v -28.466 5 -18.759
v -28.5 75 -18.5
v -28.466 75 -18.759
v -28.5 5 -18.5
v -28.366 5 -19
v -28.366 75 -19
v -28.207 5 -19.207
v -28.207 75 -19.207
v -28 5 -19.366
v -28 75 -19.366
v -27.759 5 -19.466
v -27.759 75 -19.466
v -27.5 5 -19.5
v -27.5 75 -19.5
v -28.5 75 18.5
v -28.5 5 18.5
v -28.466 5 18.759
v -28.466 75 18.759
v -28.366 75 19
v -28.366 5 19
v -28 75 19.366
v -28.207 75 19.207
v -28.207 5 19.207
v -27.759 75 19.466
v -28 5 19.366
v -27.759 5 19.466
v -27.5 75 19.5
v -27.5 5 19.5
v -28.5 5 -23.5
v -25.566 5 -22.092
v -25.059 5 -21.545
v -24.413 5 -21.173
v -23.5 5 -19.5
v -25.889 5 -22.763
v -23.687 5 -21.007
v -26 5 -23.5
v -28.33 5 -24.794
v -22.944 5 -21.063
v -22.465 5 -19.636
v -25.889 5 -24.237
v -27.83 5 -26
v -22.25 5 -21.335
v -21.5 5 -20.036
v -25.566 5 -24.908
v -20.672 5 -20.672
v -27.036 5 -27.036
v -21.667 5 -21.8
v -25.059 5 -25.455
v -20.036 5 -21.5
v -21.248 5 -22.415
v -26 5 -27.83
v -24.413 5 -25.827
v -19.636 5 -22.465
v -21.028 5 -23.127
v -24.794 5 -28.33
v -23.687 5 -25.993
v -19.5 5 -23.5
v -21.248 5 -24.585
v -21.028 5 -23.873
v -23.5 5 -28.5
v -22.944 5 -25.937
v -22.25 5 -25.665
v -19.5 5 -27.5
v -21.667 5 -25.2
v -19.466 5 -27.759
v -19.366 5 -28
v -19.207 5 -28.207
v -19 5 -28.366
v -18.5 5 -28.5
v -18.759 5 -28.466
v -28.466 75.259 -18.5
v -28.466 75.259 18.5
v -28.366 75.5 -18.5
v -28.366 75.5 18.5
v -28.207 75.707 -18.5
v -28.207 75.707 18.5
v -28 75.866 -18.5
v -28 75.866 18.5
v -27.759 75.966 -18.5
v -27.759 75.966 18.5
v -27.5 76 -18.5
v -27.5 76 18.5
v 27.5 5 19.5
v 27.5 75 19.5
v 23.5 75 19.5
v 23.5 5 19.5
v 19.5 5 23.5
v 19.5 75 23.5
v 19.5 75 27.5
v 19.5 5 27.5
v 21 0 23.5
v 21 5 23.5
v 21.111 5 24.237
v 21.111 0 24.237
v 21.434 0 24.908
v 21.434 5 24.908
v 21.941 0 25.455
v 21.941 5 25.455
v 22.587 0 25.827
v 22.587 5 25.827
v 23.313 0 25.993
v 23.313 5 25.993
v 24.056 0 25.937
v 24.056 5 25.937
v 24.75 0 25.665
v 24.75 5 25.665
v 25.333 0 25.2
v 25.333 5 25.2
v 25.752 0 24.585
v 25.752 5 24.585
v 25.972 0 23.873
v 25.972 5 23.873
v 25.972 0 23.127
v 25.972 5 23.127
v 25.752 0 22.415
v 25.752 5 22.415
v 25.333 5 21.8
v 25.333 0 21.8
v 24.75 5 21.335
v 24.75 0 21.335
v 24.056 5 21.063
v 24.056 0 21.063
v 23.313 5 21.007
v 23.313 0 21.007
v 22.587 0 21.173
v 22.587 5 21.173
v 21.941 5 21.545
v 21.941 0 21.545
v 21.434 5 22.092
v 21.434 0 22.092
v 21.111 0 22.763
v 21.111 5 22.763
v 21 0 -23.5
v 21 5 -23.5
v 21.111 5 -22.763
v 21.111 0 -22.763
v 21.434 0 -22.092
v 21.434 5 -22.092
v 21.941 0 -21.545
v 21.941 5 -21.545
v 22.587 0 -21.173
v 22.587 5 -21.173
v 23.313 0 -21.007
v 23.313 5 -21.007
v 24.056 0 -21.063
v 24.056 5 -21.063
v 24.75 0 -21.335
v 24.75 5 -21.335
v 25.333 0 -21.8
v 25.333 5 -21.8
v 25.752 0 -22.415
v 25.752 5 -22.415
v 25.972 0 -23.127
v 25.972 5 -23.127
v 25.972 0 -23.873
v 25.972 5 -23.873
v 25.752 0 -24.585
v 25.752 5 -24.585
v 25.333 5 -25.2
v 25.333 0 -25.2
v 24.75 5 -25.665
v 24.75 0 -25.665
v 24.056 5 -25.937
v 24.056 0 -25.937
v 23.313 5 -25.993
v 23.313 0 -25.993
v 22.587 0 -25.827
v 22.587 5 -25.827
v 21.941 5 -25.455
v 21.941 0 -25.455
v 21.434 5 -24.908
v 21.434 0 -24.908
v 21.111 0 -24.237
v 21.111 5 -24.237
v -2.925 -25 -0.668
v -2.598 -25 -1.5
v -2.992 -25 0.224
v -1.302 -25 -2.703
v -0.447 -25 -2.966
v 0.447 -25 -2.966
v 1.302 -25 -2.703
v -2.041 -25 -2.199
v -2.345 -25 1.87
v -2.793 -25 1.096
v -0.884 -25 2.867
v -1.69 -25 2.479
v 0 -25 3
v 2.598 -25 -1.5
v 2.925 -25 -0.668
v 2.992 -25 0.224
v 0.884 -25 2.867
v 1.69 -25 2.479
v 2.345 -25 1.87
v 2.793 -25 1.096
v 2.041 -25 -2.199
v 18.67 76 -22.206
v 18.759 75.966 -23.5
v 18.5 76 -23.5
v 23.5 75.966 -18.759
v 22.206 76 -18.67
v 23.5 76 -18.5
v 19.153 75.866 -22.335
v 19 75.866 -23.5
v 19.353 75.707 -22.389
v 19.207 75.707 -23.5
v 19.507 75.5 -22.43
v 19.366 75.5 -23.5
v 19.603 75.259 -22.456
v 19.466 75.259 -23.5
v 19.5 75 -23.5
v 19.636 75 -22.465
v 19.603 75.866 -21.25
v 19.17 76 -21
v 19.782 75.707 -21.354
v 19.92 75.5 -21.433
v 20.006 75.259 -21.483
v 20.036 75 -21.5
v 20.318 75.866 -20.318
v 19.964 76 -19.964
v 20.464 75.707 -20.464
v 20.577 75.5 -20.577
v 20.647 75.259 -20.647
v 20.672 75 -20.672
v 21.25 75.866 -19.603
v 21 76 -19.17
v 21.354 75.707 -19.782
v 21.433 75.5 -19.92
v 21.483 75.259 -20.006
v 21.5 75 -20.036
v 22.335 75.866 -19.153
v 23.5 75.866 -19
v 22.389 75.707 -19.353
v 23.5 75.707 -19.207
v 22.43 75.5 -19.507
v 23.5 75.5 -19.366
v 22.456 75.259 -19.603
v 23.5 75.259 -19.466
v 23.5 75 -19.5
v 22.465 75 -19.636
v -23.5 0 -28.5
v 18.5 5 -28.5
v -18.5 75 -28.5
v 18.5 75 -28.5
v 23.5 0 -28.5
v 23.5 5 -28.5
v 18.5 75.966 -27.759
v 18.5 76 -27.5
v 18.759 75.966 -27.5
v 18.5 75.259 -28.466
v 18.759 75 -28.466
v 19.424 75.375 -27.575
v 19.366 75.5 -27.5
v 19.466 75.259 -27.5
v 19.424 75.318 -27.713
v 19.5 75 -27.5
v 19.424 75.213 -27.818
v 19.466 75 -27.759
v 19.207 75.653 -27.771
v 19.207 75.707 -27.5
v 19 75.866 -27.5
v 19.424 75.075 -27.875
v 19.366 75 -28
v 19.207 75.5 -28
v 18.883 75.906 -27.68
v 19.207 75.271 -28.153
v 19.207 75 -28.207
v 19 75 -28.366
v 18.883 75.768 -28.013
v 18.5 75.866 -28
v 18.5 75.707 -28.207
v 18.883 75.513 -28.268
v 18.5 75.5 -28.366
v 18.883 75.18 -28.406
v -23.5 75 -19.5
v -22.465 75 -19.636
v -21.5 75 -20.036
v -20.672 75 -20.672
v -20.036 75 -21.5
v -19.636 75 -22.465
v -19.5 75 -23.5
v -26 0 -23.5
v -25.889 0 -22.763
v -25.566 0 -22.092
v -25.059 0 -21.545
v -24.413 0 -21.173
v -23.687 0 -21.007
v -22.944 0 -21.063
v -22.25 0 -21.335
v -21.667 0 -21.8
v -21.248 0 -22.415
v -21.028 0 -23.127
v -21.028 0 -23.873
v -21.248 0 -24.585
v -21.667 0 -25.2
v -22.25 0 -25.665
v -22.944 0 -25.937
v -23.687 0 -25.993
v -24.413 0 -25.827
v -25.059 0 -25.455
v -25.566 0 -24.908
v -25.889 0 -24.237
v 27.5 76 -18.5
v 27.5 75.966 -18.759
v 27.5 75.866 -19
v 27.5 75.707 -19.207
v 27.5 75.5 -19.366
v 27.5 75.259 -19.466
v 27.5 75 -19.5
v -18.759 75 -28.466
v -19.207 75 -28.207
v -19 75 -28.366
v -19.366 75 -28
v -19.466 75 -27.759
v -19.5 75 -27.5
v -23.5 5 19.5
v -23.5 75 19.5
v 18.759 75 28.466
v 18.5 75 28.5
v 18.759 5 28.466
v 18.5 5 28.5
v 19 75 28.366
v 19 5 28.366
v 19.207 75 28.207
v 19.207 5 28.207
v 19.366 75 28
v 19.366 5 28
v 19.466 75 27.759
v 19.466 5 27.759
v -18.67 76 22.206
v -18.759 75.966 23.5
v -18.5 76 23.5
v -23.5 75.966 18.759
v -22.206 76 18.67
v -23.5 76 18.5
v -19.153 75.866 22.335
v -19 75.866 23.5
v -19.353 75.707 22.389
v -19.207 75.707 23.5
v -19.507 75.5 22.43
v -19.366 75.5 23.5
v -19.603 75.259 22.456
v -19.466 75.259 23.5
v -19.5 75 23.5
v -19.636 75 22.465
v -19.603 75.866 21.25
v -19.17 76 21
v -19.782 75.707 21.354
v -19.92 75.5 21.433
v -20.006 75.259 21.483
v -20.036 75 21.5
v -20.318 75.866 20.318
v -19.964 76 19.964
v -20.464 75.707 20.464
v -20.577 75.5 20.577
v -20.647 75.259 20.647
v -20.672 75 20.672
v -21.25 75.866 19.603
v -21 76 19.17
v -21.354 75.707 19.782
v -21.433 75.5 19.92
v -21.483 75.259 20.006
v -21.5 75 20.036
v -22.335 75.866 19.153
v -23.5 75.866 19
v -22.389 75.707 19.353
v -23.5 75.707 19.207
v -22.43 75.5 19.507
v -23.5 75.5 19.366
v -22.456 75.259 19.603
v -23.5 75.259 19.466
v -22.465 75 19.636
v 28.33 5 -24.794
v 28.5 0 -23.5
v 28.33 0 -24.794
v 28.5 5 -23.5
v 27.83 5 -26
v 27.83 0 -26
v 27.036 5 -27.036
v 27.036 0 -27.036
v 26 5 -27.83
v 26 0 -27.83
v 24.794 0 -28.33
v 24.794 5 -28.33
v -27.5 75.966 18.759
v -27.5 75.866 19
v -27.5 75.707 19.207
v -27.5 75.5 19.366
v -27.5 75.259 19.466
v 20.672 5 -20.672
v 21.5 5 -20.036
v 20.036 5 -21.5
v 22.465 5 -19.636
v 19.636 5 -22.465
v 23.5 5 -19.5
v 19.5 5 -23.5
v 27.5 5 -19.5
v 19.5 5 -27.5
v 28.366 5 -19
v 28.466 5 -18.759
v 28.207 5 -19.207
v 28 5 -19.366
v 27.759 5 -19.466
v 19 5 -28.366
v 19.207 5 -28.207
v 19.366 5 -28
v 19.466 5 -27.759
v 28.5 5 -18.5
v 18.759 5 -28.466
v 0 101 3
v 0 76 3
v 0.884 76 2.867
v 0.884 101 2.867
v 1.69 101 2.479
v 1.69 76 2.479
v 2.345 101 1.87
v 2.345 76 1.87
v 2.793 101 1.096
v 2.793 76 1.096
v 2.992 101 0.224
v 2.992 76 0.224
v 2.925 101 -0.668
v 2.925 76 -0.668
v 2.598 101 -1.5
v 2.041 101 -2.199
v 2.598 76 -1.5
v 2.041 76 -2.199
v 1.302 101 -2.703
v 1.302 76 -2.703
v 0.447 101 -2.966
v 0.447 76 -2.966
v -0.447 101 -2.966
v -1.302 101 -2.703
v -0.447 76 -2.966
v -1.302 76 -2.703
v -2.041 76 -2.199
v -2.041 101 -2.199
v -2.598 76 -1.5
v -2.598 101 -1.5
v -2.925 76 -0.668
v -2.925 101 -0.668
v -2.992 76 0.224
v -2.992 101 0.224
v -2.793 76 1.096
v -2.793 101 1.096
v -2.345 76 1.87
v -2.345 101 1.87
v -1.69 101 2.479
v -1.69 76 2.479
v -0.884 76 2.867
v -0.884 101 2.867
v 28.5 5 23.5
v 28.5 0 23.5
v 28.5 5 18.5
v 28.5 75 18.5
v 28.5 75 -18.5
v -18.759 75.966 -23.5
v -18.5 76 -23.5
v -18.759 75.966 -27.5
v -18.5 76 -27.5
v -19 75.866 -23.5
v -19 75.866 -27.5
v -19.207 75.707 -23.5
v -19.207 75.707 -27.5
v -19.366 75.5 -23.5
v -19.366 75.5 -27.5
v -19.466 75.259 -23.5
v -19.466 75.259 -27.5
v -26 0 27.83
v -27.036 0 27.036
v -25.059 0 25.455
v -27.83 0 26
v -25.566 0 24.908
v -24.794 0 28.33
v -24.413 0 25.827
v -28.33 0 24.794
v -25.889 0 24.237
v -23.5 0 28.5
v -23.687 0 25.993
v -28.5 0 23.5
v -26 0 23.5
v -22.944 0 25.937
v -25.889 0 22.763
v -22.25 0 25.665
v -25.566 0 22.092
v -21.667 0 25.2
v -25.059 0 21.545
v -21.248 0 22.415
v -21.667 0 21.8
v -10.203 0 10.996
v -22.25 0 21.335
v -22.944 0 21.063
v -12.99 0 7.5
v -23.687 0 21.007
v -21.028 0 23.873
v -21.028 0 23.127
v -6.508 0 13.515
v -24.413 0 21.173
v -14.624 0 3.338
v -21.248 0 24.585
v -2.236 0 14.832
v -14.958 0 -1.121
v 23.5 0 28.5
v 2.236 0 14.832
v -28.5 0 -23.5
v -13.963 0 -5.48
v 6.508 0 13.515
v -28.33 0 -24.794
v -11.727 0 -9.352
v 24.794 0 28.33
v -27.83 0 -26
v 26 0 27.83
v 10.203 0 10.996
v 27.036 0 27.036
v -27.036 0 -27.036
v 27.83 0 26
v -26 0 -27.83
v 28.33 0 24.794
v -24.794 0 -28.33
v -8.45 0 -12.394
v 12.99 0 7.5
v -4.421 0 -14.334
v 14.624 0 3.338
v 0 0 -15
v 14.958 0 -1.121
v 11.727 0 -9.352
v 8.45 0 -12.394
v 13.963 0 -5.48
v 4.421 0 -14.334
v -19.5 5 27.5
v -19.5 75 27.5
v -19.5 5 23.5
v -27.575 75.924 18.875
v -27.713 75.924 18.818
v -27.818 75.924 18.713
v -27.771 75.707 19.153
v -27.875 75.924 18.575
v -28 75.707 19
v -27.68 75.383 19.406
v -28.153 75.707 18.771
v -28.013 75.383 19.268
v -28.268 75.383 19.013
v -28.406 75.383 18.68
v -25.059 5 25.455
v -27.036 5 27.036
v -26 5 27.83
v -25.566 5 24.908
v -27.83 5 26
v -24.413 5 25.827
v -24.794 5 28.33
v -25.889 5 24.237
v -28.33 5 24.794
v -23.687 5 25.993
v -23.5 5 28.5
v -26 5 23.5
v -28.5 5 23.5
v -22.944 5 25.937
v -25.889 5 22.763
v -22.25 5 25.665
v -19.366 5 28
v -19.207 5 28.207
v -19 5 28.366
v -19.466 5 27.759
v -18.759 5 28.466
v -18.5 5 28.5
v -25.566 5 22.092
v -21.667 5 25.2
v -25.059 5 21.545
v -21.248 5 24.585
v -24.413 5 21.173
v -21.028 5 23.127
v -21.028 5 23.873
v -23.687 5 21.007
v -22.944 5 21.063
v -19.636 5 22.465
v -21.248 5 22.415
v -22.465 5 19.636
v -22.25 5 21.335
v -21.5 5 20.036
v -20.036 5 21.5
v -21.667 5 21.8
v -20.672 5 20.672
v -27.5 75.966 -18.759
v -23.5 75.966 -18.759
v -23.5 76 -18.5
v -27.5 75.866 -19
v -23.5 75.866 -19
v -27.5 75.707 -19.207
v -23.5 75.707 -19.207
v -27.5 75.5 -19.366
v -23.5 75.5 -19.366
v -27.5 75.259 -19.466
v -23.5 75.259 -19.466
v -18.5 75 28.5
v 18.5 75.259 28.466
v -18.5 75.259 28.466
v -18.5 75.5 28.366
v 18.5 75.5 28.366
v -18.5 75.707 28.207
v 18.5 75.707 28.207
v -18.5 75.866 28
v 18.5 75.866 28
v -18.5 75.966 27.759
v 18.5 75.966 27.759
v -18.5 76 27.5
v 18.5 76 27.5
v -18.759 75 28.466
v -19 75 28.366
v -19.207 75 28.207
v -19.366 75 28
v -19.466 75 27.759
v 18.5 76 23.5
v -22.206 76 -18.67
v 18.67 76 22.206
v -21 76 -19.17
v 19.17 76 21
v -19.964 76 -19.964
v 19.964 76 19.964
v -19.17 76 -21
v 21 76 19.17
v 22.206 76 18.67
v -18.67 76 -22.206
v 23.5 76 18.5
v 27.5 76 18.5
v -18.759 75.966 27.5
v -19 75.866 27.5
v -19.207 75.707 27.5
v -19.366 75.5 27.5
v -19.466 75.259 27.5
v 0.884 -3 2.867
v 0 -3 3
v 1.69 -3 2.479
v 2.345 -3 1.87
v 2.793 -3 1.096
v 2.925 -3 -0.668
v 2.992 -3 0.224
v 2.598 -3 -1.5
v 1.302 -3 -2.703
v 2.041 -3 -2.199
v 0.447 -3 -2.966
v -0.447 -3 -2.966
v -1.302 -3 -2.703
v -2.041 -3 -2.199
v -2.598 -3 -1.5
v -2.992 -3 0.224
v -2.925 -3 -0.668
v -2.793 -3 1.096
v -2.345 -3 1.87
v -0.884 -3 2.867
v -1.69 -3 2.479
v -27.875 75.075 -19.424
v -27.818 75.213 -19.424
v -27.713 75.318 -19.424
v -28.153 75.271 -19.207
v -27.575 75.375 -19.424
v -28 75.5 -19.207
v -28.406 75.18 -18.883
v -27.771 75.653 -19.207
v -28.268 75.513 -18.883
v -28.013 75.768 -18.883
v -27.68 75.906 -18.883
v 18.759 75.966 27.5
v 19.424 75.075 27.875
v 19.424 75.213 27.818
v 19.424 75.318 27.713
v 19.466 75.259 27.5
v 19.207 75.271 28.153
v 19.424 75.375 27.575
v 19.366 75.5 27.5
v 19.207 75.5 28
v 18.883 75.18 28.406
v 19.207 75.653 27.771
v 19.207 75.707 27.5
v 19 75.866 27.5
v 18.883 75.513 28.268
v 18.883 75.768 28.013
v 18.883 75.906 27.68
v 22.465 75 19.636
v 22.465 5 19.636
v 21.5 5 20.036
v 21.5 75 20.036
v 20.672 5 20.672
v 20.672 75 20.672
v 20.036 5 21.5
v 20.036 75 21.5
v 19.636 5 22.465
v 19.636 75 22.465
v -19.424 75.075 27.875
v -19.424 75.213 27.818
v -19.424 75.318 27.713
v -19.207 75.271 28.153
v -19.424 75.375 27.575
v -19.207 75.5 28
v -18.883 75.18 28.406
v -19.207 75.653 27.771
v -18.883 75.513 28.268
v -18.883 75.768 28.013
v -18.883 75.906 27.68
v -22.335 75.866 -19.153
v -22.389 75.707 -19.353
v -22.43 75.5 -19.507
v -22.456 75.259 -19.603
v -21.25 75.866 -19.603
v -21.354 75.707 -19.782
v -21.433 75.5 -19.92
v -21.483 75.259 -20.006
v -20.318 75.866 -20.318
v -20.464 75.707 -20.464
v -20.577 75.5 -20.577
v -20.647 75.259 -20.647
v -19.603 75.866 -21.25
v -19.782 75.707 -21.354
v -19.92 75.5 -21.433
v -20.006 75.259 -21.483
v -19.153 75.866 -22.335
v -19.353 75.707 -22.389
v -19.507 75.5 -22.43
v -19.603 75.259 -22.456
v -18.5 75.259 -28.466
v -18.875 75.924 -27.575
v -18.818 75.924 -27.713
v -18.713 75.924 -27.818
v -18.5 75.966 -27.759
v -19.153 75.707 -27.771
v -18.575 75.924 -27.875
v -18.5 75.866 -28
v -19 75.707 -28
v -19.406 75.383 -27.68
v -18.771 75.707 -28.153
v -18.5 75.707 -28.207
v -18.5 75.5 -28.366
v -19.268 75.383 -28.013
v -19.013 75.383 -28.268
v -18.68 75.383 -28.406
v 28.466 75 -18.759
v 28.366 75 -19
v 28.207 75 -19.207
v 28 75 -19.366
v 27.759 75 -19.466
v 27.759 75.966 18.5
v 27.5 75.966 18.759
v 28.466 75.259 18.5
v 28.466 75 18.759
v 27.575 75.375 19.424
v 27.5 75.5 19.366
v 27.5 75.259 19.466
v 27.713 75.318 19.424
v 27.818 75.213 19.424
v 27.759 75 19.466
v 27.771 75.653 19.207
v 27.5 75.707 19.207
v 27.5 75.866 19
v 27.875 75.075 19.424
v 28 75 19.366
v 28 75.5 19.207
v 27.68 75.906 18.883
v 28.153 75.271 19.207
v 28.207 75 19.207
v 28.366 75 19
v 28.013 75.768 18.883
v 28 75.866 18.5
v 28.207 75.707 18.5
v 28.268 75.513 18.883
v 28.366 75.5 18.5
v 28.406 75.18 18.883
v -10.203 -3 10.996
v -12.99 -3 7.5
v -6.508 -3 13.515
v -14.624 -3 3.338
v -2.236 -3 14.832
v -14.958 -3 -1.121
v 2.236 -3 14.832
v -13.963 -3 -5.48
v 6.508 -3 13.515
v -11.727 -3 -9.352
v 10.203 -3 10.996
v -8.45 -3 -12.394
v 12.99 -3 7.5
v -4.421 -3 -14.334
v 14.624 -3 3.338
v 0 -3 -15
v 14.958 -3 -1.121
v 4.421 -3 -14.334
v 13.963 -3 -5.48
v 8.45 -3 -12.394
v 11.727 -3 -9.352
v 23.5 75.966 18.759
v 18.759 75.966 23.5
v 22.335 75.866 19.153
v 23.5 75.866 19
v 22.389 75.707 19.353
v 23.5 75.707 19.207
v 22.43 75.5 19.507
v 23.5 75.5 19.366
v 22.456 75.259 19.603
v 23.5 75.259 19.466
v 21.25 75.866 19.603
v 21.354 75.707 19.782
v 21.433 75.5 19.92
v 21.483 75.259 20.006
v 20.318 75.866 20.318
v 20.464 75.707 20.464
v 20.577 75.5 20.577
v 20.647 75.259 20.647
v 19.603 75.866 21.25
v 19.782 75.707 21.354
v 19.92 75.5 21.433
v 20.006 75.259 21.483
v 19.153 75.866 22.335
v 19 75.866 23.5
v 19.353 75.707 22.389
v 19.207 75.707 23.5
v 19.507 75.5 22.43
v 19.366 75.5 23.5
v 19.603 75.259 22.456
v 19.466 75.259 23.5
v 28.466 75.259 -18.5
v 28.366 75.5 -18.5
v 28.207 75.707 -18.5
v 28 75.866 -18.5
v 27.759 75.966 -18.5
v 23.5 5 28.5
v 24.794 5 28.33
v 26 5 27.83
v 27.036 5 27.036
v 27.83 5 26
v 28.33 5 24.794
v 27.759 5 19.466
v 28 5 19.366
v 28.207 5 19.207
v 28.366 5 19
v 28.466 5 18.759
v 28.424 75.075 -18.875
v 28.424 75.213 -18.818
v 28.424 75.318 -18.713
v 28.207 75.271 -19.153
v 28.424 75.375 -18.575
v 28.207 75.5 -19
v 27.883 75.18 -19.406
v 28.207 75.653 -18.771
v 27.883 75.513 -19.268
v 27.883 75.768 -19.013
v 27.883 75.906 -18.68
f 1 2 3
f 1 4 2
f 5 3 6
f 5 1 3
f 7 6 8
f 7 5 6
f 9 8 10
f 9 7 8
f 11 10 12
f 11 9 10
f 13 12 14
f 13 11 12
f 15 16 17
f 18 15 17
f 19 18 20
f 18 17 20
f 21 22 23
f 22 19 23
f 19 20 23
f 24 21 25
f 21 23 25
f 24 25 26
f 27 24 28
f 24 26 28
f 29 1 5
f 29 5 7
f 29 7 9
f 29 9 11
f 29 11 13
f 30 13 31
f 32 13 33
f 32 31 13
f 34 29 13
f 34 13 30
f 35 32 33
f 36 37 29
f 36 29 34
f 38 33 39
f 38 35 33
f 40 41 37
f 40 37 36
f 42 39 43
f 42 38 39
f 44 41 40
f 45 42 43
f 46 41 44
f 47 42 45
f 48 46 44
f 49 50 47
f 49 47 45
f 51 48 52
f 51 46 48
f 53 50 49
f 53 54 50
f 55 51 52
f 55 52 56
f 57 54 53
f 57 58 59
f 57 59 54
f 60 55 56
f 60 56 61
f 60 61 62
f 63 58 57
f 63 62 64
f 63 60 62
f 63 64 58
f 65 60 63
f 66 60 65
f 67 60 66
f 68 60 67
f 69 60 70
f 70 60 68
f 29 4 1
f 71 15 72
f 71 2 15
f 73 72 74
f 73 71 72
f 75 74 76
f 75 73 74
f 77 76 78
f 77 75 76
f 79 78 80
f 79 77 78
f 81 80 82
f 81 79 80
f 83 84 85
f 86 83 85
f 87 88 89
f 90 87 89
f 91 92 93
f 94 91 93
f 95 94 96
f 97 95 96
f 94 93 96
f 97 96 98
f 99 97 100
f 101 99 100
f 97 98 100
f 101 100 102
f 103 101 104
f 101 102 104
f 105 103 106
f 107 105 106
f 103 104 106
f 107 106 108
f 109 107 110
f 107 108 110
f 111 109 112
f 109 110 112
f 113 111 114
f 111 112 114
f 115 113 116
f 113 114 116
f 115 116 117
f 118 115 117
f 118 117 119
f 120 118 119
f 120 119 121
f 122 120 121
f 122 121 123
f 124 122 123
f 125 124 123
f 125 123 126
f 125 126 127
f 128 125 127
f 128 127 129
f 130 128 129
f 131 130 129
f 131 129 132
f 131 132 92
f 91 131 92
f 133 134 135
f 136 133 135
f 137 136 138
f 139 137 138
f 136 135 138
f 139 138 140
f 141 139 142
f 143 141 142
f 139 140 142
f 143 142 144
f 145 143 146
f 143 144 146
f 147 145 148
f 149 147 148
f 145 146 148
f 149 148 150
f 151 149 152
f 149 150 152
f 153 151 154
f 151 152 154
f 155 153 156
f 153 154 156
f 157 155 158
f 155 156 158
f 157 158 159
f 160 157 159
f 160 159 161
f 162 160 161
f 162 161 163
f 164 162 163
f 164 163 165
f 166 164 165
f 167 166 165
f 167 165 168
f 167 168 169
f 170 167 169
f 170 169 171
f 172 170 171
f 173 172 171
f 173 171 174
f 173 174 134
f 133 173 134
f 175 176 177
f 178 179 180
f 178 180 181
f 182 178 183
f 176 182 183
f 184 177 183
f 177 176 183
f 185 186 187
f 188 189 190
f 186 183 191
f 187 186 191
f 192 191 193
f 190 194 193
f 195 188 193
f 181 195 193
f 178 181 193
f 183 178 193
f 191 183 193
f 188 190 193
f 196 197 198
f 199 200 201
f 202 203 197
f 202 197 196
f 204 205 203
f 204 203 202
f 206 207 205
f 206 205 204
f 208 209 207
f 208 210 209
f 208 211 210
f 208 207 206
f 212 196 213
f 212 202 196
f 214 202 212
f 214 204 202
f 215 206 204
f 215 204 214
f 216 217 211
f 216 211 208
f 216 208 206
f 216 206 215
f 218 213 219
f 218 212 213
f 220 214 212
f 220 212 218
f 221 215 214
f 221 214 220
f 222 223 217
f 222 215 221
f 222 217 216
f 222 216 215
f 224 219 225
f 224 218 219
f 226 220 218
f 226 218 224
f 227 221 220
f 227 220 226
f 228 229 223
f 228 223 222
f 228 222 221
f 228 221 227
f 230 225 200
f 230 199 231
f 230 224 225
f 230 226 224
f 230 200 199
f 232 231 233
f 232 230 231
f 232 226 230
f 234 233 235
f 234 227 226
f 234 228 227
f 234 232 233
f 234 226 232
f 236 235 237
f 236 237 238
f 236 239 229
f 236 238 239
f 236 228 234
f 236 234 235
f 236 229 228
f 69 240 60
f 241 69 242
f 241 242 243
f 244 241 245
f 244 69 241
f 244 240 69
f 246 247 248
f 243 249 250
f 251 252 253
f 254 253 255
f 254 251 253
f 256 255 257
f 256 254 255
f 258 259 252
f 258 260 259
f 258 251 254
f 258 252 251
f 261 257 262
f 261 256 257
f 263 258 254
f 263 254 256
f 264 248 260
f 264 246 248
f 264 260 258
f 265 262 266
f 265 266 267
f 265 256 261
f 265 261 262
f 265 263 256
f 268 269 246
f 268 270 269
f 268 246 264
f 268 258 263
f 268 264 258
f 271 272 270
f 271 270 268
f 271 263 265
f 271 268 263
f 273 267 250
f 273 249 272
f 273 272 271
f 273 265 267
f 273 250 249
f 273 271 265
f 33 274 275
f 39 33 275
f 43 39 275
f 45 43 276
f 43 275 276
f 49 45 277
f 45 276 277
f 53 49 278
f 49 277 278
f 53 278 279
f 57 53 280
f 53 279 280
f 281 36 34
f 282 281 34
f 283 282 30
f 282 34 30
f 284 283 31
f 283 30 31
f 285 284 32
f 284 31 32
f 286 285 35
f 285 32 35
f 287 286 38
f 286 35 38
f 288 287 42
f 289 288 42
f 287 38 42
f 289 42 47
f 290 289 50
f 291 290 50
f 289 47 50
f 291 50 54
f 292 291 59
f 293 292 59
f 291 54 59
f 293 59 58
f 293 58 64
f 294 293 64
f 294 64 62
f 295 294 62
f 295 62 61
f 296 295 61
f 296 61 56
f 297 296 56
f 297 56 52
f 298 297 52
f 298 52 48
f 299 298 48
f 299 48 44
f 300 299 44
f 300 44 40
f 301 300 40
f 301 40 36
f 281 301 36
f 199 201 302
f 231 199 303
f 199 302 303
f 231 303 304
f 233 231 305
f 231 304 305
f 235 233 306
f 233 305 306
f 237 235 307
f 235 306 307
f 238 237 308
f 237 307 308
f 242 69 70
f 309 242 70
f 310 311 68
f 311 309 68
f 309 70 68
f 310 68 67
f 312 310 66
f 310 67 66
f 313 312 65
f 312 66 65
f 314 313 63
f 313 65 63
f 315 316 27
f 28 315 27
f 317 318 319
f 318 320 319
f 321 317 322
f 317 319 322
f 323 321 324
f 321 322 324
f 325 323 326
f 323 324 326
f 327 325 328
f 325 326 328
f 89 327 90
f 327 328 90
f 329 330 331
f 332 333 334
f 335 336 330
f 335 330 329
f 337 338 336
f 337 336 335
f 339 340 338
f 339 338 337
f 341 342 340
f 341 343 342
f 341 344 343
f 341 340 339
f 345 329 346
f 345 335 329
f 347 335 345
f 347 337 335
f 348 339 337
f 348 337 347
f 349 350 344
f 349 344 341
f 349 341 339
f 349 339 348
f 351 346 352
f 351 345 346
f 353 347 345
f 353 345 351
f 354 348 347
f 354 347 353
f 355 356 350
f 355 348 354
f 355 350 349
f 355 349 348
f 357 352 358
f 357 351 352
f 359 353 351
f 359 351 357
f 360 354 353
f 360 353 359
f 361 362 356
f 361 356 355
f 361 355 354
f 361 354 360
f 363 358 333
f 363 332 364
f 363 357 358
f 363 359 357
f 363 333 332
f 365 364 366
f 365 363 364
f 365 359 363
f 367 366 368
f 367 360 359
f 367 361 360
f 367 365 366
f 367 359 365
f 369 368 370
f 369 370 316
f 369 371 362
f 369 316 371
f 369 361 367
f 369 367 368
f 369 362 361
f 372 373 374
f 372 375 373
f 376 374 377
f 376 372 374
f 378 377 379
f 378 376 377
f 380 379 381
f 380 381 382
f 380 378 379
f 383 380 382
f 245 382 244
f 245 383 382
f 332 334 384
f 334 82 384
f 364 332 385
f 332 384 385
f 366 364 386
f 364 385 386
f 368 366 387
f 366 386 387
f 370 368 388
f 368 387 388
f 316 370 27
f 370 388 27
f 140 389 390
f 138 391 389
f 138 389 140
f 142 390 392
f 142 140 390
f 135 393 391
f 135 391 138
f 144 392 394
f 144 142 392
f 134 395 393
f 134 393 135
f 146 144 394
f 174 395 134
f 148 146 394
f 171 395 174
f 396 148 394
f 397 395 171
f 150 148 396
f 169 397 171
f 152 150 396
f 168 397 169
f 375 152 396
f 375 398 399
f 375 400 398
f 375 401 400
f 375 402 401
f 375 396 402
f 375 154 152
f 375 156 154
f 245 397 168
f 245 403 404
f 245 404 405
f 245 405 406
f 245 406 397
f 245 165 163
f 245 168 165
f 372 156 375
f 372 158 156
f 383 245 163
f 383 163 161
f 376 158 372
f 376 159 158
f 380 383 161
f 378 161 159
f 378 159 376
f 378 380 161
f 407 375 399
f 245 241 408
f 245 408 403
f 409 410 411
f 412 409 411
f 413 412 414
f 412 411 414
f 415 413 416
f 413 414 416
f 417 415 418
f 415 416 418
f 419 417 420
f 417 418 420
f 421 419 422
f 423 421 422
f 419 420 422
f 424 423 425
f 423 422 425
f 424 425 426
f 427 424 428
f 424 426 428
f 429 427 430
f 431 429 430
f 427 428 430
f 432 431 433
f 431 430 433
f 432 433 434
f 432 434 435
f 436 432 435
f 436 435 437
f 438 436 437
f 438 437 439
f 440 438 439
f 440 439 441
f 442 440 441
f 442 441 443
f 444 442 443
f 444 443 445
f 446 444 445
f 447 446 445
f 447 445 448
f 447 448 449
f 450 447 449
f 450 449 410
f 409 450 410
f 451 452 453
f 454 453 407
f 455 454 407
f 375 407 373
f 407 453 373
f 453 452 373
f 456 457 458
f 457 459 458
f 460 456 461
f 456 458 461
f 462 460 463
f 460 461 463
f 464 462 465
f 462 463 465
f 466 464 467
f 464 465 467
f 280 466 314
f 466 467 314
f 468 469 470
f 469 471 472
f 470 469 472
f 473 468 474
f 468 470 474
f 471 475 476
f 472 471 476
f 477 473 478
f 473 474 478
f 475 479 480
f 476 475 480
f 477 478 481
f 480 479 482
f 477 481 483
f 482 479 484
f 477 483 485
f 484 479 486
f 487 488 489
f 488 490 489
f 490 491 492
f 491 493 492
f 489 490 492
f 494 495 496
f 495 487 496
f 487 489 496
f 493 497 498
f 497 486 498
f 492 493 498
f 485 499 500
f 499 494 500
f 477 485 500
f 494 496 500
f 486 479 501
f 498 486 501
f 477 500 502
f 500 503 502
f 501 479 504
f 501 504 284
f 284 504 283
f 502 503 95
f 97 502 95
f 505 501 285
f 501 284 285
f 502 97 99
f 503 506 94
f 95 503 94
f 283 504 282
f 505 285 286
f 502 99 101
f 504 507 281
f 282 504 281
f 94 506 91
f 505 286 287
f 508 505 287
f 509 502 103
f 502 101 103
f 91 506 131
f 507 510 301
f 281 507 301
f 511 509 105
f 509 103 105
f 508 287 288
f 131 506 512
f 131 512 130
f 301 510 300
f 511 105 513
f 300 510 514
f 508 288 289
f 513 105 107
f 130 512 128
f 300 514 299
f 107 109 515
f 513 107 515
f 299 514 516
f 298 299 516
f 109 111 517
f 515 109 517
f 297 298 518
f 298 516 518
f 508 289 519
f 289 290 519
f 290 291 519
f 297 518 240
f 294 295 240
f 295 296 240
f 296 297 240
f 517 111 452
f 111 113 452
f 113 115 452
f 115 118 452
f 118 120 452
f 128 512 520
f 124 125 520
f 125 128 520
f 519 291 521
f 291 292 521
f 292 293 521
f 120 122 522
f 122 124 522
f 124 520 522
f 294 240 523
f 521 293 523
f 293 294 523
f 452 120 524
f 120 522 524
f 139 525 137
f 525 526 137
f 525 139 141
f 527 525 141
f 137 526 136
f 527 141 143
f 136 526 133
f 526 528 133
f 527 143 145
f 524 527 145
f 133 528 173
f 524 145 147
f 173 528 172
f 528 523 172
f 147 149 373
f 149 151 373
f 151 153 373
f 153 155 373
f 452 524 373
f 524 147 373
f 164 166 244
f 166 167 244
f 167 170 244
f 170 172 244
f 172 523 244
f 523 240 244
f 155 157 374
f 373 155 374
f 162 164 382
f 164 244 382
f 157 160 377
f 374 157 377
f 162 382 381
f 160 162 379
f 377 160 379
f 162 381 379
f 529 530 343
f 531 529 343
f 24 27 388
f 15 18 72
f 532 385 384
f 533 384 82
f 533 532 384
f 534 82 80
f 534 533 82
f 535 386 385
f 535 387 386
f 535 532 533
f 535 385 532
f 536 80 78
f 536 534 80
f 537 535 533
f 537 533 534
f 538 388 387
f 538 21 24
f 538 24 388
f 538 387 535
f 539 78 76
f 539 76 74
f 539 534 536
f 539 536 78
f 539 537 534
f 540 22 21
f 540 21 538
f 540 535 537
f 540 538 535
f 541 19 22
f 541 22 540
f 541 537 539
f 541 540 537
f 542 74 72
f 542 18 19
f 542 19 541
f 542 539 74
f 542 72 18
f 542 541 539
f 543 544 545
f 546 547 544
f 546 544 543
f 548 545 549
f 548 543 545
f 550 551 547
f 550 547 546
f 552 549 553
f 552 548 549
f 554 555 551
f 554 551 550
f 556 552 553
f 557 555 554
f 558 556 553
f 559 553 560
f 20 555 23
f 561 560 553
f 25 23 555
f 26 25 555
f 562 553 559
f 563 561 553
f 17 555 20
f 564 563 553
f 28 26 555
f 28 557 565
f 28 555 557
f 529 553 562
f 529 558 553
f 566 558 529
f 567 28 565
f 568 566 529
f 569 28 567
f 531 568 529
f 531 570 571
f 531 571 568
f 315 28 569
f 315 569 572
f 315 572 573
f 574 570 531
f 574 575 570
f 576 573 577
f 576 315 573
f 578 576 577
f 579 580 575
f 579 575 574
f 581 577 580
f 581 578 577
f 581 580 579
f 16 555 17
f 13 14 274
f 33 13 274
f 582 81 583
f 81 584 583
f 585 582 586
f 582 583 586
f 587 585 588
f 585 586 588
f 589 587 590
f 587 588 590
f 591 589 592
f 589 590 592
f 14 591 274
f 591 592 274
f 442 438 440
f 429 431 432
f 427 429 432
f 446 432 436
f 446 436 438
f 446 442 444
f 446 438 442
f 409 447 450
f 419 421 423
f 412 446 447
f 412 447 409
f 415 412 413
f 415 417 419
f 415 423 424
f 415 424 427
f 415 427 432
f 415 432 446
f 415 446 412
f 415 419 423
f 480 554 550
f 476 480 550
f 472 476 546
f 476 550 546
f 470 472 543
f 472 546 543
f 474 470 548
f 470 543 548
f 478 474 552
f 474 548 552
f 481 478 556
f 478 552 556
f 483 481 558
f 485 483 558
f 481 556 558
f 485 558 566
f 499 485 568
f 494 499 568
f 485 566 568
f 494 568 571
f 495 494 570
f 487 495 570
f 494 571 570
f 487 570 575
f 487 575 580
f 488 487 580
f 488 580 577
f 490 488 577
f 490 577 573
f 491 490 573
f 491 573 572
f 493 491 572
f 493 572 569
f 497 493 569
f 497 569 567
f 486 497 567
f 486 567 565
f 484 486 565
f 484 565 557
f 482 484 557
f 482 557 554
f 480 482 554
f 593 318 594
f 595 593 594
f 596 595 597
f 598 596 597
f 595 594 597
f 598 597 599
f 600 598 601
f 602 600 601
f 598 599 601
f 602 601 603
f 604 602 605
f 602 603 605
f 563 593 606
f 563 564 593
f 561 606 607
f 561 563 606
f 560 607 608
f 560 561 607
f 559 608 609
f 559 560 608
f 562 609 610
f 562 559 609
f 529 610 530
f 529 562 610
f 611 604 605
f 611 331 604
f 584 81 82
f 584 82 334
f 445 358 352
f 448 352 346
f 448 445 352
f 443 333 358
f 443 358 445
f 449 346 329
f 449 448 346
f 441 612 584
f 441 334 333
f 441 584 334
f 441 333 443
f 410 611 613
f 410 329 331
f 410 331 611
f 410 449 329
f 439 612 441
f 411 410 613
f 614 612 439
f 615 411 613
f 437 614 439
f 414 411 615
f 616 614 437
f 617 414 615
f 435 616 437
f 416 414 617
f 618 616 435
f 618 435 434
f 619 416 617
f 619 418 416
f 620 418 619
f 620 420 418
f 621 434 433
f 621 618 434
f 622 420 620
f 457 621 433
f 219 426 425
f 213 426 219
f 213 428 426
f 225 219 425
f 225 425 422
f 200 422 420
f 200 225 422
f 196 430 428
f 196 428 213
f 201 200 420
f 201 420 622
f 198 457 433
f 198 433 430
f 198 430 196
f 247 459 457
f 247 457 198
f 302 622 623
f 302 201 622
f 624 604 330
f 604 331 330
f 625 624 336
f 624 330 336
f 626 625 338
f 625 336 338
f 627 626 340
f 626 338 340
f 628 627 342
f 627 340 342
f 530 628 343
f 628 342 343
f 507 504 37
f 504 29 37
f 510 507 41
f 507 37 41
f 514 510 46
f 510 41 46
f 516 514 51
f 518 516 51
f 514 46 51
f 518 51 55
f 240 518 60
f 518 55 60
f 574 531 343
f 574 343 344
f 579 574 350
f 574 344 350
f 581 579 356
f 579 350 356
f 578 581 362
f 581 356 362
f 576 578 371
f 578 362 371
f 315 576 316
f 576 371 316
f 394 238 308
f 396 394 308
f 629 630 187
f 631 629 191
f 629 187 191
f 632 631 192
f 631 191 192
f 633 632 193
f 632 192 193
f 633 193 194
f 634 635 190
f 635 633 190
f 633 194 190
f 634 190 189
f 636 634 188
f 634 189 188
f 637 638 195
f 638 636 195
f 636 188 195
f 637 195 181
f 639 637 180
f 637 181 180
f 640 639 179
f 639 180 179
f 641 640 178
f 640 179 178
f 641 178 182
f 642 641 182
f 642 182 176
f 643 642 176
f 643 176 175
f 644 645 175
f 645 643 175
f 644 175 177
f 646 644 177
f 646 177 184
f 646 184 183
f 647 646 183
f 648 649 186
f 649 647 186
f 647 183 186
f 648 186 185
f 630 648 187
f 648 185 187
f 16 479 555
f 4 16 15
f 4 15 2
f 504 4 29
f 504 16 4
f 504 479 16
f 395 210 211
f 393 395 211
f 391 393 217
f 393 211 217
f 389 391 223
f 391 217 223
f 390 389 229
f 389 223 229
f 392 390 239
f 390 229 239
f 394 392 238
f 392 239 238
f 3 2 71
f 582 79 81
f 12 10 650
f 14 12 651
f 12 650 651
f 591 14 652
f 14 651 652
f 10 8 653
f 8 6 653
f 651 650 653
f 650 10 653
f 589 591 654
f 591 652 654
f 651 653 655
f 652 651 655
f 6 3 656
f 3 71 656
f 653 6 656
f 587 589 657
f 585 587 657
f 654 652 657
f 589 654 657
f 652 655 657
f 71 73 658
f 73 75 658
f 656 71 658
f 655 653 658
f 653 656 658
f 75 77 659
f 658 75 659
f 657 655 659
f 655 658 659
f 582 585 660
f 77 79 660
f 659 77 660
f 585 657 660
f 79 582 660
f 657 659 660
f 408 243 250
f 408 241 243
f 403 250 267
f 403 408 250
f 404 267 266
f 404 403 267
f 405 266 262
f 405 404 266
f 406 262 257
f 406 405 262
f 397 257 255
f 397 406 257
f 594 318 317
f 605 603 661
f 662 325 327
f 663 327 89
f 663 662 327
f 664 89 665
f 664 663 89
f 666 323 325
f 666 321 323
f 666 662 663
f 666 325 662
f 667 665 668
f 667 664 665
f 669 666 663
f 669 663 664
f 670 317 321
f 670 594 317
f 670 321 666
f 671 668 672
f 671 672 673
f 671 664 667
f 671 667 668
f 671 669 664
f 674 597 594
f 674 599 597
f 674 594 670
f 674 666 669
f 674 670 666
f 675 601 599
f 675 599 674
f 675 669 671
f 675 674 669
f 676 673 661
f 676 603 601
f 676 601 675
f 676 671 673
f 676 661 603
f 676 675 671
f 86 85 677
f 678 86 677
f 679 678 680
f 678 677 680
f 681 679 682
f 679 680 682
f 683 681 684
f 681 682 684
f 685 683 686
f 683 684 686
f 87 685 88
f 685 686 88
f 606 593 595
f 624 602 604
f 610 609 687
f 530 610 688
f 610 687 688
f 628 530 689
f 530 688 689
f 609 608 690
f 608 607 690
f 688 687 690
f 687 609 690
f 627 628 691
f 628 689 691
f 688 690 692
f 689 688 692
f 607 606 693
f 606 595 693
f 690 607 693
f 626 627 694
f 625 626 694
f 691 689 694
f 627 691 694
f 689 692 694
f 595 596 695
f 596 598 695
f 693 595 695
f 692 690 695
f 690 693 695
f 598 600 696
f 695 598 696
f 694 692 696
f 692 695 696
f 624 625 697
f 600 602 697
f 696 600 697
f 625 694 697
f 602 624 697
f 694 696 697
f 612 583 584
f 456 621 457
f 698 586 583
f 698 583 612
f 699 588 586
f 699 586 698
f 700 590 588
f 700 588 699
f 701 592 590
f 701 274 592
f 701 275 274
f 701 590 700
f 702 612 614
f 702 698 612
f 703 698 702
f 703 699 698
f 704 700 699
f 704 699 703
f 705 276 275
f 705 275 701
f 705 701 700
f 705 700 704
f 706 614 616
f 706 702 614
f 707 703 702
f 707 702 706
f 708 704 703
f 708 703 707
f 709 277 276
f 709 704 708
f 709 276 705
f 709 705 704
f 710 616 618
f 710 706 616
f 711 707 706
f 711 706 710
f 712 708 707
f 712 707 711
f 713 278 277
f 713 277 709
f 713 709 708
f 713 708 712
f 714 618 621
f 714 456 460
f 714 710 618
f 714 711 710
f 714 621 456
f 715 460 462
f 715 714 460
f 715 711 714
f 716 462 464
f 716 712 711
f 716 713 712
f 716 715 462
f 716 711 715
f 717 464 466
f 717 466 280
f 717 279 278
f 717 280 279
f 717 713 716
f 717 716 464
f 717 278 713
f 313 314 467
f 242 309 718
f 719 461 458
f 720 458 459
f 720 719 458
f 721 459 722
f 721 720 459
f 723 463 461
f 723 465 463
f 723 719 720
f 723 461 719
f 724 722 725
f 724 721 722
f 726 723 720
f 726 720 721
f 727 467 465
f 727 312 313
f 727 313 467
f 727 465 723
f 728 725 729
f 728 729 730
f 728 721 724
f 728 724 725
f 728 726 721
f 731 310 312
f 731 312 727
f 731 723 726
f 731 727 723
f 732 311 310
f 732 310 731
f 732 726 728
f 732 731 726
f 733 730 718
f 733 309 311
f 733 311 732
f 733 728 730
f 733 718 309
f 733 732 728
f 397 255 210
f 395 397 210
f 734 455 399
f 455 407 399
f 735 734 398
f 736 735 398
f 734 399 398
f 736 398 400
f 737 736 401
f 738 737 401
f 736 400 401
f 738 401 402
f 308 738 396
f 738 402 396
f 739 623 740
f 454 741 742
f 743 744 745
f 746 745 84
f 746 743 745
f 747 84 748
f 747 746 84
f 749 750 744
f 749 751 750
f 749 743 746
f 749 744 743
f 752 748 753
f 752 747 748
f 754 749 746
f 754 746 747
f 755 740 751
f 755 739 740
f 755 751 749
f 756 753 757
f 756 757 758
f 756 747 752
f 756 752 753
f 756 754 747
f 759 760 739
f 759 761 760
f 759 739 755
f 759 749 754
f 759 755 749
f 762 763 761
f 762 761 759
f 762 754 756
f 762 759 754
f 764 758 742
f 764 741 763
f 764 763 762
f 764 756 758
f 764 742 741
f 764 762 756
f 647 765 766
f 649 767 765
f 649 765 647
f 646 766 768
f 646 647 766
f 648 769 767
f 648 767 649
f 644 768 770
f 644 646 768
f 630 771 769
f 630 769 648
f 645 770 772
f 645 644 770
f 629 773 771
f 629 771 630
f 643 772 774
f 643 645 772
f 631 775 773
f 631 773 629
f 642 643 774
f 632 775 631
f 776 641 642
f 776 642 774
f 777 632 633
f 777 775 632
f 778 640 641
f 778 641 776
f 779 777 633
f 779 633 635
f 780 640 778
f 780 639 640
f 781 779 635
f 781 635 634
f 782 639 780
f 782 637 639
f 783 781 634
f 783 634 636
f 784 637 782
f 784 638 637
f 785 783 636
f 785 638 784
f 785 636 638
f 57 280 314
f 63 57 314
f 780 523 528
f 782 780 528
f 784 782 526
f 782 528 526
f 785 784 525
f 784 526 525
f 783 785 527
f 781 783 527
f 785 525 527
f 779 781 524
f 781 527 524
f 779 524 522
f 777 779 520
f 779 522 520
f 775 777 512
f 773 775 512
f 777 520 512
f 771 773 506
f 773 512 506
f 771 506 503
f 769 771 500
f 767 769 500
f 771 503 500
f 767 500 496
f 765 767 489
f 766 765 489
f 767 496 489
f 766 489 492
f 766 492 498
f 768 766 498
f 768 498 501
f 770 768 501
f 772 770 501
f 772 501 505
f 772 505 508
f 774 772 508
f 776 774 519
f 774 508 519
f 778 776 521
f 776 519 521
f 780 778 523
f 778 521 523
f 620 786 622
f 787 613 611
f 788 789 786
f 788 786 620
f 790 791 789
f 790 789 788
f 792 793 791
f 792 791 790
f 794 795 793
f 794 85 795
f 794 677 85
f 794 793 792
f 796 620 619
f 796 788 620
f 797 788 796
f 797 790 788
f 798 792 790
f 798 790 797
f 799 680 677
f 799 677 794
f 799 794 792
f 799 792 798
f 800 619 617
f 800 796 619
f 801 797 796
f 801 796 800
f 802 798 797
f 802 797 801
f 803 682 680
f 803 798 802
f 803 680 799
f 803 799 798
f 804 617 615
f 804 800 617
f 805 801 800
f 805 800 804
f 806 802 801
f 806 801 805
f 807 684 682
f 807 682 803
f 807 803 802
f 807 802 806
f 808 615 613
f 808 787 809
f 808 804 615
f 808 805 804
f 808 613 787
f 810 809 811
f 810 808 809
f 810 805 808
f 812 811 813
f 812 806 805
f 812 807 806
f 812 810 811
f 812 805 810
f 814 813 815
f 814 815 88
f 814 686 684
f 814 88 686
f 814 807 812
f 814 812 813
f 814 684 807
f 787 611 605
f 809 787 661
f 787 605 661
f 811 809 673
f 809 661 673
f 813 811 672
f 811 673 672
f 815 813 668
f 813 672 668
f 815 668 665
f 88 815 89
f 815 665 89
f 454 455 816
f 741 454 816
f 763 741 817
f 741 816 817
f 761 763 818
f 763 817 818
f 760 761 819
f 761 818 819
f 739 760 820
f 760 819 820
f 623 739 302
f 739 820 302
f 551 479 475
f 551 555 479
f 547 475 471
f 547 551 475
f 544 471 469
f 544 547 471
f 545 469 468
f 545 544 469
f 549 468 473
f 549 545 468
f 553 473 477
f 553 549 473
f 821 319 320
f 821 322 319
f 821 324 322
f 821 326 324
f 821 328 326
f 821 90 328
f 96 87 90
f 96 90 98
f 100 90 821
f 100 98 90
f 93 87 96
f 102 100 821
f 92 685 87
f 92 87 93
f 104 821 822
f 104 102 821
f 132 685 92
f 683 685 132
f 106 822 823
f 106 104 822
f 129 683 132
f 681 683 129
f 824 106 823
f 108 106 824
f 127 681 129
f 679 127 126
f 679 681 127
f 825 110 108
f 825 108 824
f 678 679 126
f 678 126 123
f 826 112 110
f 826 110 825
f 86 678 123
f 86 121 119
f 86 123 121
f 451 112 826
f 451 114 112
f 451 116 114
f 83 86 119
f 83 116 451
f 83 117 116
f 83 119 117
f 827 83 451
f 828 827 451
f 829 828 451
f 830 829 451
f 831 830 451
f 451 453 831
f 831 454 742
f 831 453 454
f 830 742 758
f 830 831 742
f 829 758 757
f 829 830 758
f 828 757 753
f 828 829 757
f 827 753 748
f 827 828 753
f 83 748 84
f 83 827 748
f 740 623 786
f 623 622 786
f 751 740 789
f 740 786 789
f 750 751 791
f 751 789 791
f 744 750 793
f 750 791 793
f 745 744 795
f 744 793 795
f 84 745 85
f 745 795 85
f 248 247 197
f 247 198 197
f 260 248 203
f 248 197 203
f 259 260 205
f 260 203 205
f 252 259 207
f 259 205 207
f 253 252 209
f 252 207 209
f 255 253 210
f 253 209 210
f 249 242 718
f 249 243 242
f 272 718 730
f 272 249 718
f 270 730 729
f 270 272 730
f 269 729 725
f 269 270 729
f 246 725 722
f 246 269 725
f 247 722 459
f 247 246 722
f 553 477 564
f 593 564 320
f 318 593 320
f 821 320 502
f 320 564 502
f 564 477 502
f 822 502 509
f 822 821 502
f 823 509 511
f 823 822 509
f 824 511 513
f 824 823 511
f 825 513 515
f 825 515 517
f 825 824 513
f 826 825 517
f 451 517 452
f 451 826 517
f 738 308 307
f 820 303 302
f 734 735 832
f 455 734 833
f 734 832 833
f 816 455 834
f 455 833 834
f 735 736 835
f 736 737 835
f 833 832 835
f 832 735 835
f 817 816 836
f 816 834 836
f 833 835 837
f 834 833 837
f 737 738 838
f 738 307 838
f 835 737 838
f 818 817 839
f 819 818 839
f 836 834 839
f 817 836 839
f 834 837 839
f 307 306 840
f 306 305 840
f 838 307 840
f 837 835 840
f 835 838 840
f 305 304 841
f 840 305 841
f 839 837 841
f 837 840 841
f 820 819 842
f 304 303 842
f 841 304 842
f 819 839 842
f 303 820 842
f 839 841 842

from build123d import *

# Parameters (mm, degrees)
SKETCH1_W                = 57
SKETCH1_H                = 57
EXTRUDE1_DEPTH           = 76
F_5_0_5_DIAMETER_HOLE1_D = 5
SKETCH6_R                = 4
SKETCH6_R_2              = 2.5
EXTRUDE4_DEPTH           = 71
FILLET1_R                = 5
EXTRUDE5_DEPTH           = 25
EXTRUDE5_DEPTH_BACK      = 101
SKETCH7_R                = 3
SKETCH8_R                = 15
EXTRUDE6_DEPTH           = 3
FILLET2_R                = 1


with BuildPart() as part:
    # Sketch1 → Extrude1 (new body)
    with BuildSketch(Plane(origin=(0, 0, 0), x_dir=(1, 0, 0), z_dir=(0, 1, 0))):
        Rectangle(SKETCH1_W, SKETCH1_H)
    extrude(amount=EXTRUDE1_DEPTH)

    # Ø5.0 (5) Diameter Hole1 (through all)
    with Locations(Plane.XZ):
        with Locations((-23.5, 23.5), (23.5, 23.5), (23.5, -23.5), (-23.5, -23.5)):
            Hole(F_5_0_5_DIAMETER_HOLE1_D / 2)

    # Sketch6 → Extrude4 (cut)
    # profile 1 of 12: a face of its own
    with BuildSketch(Plane(origin=(0, 76, 0), x_dir=(1, 0, 0), z_dir=(0, 1, 0))):
        Polygon((-28.5, 28.5), (-19.5, 28.5), (-19.5, 32.511741208), (-33.908905561, 32.511741208), (-33.908905561, 19.5), (-28.5, 19.5), align=None)
    # profile 2 of 12: a face of its own
    with BuildSketch(Plane(origin=(0, 76, 0), x_dir=(1, 0, 0), z_dir=(0, 1, 0))):
        with BuildLine():
            ThreePointArc((-23.5, 19.5), (-26.328427125, 26.328427125), (-19.5, 23.5))
            Line((-19.5, 23.5), (-19.5, 28.5))
            Line((-19.5, 28.5), (-28.5, 28.5))
            Line((-28.5, 28.5), (-28.5, 19.5))
            Line((-28.5, 19.5), (-23.5, 19.5))
        make_face()
    # profile 3 of 12: a face of its own
    with BuildSketch(Plane(origin=(0, 76, 0), x_dir=(1, 0, 0), z_dir=(0, 1, 0))):
        with Locations((-23.5, 23.5)):
            Circle(SKETCH6_R)
        with Locations(Location((-23.5, 23.5, 0), (0, 0, 90))):
            Circle(SKETCH6_R_2, mode=Mode.SUBTRACT)
    # profile 4 of 12: a face of its own
    with BuildSketch(Plane(origin=(0, 76, 0), x_dir=(1, 0, 0), z_dir=(0, 1, 0))):
        Polygon((19.5, 36.471560472), (19.5, 28.5), (28.5, 28.5), (28.5, 19.5), (41.168352552, 19.5), (41.168352552, 36.471560472), align=None)
    # profile 5 of 12: a face of its own
    with BuildSketch(Plane(origin=(0, 76, 0), x_dir=(1, 0, 0), z_dir=(0, 1, 0))):
        with BuildLine():
            Line((28.5, 28.5), (19.5, 28.5))
            Line((19.5, 28.5), (19.5, 23.5))
            ThreePointArc((19.5, 23.5), (23.5, 27.5), (27.5, 23.5))
            ThreePointArc((27.5, 23.5), (26.328427125, 20.671572875), (23.5, 19.5))
            Line((23.5, 19.5), (28.5, 19.5))
            Line((28.5, 19.5), (28.5, 28.5))
        make_face()
    # profile 6 of 12: a face of its own
    with BuildSketch(Plane(origin=(0, 76, 0), x_dir=(1, 0, 0), z_dir=(0, 1, 0))):
        with Locations((23.5, 23.5)):
            Circle(SKETCH6_R)
        with Locations(Location((23.5, 23.5, 0), (0, 0, 90))):
            Circle(SKETCH6_R_2, mode=Mode.SUBTRACT)
    # profile 7 of 12: a face of its own
    with BuildSketch(Plane(origin=(0, 76, 0), x_dir=(1, 0, 0), z_dir=(0, 1, 0))):
        with Locations((23.5, -23.5)):
            Circle(SKETCH6_R)
        with Locations(Location((23.5, -23.5, 0), (0, 0, 90))):
            Circle(SKETCH6_R_2, mode=Mode.SUBTRACT)
    # profile 8 of 12: a face of its own
    with BuildSketch(Plane(origin=(0, 76, 0), x_dir=(1, 0, 0), z_dir=(0, 1, 0))):
        with BuildLine():
            Line((28.5, -28.5), (28.5, -19.5))
            Line((28.5, -19.5), (23.5, -19.5))
            ThreePointArc((23.5, -19.5), (26.328427125, -20.671572875), (27.5, -23.5))
            ThreePointArc((27.5, -23.5), (23.5, -27.5), (19.5, -23.5))
            Line((19.5, -23.5), (19.5, -28.5))
            Line((19.5, -28.5), (28.5, -28.5))
        make_face()
    # profile 9 of 12: a face of its own
    with BuildSketch(Plane(origin=(0, 76, 0), x_dir=(1, 0, 0), z_dir=(0, 1, 0))):
        Polygon((44.252209519, -19.5), (28.5, -19.5), (28.5, -28.5), (19.5, -28.5), (19.5, -40.050429997), (44.252209519, -40.050429997), align=None)
    # profile 10 of 12: a face of its own
    with BuildSketch(Plane(origin=(0, 76, 0), x_dir=(1, 0, 0), z_dir=(0, 1, 0))):
        Polygon((-28.5, -28.5), (-28.5, -19.5), (-37.670786859, -19.5), (-37.670786859, -37.828231874), (-19.5, -37.828231874), (-19.5, -28.5), align=None)
    # profile 11 of 12: a face of its own
    with BuildSketch(Plane(origin=(0, 76, 0), x_dir=(1, 0, 0), z_dir=(0, 1, 0))):
        with BuildLine():
            Line((-23.5, -19.5), (-28.5, -19.5))
            Line((-28.5, -19.5), (-28.5, -28.5))
            Line((-28.5, -28.5), (-19.5, -28.5))
            Line((-19.5, -28.5), (-19.5, -23.5))
            ThreePointArc((-19.5, -23.5), (-26.328427125, -26.328427125), (-23.5, -19.5))
        make_face()
    # profile 12 of 12: a face of its own
    with BuildSketch(Plane(origin=(0, 76, 0), x_dir=(1, 0, 0), z_dir=(0, 1, 0))):
        with Locations((-23.5, -23.5)):
            Circle(SKETCH6_R)
        with Locations(Location((-23.5, -23.5, 0), (0, 0, 90))):
            Circle(SKETCH6_R_2, mode=Mode.SUBTRACT)
    extrude(amount=-EXTRUDE4_DEPTH, mode=Mode.SUBTRACT)

    # Fillet1
    fillet1_edges = [part.edges().sort_by_distance(p)[0] for p in [
        (-28.5, 2.5, 28.5),
        (-28.5, 2.5, -28.5),
        (28.5, 2.5, -28.5),
        (28.5, 2.5, 28.5),
    ]]
    fillet(fillet1_edges, radius=FILLET1_R)



with BuildPart() as body_2:
    # Sketch7 → Extrude5 (new, two sides: drawn at the far end of the back side and taken through both)
    with BuildSketch(Plane(origin=(0, 76, 0), x_dir=(1, 0, 0), z_dir=(0, 1, 0)).offset(-EXTRUDE5_DEPTH_BACK)):
        with Locations(Location((0, 0, 0), (0, 0, 270))):
            Circle(SKETCH7_R)
    extrude(amount=EXTRUDE5_DEPTH + EXTRUDE5_DEPTH_BACK)


with BuildPart() as part_1:
    add(part.part)

    add(body_2.part)  # Extrude6 merges body 2
    # Sketch8 → Extrude6 (add)
    with BuildSketch(Plane.XZ):
        with Locations(Location((0, 0, 0), (0, 0, 270))):
            Circle(SKETCH8_R)
    extrude(amount=EXTRUDE6_DEPTH)

    # Fillet2
    fillet2_edges = [part_1.edges().sort_by_distance(p)[0] for p in [
        (-28.5, 40.5, 19.5),
        (0, 76, 28.5),
        (-19.5, 40.5, 28.5),
        (-19.5, 76, 26),
        (-20.671572875, 76, 20.671572875),
        (-26, 76, 19.5),
        (-28.5, 76, 0),
        (-28.5, 40.5, -19.5),
        (-19.5, 40.5, -28.5),
        (-19.5, 76, -26),
        (-26, 76, -19.5),
        (-20.671572875, 76, -20.671572875),
        (0, 76, -28.5),
        (19.5, 76, -26),
        (26, 76, -19.5),
        (20.671572875, 76, -20.671572875),
        (19.5, 40.5, -28.5),
        (28.5, 40.5, -19.5),
        (19.5, 40.5, 28.5),
        (28.5, 76, 0),
        (26, 76, 19.5),
        (19.5, 76, 26),
        (20.671572875, 76, 20.671572875),
        (28.5, 40.5, 19.5),
    ]]
    fillet(fillet2_edges, radius=FILLET2_R)


solid = part_1.part
